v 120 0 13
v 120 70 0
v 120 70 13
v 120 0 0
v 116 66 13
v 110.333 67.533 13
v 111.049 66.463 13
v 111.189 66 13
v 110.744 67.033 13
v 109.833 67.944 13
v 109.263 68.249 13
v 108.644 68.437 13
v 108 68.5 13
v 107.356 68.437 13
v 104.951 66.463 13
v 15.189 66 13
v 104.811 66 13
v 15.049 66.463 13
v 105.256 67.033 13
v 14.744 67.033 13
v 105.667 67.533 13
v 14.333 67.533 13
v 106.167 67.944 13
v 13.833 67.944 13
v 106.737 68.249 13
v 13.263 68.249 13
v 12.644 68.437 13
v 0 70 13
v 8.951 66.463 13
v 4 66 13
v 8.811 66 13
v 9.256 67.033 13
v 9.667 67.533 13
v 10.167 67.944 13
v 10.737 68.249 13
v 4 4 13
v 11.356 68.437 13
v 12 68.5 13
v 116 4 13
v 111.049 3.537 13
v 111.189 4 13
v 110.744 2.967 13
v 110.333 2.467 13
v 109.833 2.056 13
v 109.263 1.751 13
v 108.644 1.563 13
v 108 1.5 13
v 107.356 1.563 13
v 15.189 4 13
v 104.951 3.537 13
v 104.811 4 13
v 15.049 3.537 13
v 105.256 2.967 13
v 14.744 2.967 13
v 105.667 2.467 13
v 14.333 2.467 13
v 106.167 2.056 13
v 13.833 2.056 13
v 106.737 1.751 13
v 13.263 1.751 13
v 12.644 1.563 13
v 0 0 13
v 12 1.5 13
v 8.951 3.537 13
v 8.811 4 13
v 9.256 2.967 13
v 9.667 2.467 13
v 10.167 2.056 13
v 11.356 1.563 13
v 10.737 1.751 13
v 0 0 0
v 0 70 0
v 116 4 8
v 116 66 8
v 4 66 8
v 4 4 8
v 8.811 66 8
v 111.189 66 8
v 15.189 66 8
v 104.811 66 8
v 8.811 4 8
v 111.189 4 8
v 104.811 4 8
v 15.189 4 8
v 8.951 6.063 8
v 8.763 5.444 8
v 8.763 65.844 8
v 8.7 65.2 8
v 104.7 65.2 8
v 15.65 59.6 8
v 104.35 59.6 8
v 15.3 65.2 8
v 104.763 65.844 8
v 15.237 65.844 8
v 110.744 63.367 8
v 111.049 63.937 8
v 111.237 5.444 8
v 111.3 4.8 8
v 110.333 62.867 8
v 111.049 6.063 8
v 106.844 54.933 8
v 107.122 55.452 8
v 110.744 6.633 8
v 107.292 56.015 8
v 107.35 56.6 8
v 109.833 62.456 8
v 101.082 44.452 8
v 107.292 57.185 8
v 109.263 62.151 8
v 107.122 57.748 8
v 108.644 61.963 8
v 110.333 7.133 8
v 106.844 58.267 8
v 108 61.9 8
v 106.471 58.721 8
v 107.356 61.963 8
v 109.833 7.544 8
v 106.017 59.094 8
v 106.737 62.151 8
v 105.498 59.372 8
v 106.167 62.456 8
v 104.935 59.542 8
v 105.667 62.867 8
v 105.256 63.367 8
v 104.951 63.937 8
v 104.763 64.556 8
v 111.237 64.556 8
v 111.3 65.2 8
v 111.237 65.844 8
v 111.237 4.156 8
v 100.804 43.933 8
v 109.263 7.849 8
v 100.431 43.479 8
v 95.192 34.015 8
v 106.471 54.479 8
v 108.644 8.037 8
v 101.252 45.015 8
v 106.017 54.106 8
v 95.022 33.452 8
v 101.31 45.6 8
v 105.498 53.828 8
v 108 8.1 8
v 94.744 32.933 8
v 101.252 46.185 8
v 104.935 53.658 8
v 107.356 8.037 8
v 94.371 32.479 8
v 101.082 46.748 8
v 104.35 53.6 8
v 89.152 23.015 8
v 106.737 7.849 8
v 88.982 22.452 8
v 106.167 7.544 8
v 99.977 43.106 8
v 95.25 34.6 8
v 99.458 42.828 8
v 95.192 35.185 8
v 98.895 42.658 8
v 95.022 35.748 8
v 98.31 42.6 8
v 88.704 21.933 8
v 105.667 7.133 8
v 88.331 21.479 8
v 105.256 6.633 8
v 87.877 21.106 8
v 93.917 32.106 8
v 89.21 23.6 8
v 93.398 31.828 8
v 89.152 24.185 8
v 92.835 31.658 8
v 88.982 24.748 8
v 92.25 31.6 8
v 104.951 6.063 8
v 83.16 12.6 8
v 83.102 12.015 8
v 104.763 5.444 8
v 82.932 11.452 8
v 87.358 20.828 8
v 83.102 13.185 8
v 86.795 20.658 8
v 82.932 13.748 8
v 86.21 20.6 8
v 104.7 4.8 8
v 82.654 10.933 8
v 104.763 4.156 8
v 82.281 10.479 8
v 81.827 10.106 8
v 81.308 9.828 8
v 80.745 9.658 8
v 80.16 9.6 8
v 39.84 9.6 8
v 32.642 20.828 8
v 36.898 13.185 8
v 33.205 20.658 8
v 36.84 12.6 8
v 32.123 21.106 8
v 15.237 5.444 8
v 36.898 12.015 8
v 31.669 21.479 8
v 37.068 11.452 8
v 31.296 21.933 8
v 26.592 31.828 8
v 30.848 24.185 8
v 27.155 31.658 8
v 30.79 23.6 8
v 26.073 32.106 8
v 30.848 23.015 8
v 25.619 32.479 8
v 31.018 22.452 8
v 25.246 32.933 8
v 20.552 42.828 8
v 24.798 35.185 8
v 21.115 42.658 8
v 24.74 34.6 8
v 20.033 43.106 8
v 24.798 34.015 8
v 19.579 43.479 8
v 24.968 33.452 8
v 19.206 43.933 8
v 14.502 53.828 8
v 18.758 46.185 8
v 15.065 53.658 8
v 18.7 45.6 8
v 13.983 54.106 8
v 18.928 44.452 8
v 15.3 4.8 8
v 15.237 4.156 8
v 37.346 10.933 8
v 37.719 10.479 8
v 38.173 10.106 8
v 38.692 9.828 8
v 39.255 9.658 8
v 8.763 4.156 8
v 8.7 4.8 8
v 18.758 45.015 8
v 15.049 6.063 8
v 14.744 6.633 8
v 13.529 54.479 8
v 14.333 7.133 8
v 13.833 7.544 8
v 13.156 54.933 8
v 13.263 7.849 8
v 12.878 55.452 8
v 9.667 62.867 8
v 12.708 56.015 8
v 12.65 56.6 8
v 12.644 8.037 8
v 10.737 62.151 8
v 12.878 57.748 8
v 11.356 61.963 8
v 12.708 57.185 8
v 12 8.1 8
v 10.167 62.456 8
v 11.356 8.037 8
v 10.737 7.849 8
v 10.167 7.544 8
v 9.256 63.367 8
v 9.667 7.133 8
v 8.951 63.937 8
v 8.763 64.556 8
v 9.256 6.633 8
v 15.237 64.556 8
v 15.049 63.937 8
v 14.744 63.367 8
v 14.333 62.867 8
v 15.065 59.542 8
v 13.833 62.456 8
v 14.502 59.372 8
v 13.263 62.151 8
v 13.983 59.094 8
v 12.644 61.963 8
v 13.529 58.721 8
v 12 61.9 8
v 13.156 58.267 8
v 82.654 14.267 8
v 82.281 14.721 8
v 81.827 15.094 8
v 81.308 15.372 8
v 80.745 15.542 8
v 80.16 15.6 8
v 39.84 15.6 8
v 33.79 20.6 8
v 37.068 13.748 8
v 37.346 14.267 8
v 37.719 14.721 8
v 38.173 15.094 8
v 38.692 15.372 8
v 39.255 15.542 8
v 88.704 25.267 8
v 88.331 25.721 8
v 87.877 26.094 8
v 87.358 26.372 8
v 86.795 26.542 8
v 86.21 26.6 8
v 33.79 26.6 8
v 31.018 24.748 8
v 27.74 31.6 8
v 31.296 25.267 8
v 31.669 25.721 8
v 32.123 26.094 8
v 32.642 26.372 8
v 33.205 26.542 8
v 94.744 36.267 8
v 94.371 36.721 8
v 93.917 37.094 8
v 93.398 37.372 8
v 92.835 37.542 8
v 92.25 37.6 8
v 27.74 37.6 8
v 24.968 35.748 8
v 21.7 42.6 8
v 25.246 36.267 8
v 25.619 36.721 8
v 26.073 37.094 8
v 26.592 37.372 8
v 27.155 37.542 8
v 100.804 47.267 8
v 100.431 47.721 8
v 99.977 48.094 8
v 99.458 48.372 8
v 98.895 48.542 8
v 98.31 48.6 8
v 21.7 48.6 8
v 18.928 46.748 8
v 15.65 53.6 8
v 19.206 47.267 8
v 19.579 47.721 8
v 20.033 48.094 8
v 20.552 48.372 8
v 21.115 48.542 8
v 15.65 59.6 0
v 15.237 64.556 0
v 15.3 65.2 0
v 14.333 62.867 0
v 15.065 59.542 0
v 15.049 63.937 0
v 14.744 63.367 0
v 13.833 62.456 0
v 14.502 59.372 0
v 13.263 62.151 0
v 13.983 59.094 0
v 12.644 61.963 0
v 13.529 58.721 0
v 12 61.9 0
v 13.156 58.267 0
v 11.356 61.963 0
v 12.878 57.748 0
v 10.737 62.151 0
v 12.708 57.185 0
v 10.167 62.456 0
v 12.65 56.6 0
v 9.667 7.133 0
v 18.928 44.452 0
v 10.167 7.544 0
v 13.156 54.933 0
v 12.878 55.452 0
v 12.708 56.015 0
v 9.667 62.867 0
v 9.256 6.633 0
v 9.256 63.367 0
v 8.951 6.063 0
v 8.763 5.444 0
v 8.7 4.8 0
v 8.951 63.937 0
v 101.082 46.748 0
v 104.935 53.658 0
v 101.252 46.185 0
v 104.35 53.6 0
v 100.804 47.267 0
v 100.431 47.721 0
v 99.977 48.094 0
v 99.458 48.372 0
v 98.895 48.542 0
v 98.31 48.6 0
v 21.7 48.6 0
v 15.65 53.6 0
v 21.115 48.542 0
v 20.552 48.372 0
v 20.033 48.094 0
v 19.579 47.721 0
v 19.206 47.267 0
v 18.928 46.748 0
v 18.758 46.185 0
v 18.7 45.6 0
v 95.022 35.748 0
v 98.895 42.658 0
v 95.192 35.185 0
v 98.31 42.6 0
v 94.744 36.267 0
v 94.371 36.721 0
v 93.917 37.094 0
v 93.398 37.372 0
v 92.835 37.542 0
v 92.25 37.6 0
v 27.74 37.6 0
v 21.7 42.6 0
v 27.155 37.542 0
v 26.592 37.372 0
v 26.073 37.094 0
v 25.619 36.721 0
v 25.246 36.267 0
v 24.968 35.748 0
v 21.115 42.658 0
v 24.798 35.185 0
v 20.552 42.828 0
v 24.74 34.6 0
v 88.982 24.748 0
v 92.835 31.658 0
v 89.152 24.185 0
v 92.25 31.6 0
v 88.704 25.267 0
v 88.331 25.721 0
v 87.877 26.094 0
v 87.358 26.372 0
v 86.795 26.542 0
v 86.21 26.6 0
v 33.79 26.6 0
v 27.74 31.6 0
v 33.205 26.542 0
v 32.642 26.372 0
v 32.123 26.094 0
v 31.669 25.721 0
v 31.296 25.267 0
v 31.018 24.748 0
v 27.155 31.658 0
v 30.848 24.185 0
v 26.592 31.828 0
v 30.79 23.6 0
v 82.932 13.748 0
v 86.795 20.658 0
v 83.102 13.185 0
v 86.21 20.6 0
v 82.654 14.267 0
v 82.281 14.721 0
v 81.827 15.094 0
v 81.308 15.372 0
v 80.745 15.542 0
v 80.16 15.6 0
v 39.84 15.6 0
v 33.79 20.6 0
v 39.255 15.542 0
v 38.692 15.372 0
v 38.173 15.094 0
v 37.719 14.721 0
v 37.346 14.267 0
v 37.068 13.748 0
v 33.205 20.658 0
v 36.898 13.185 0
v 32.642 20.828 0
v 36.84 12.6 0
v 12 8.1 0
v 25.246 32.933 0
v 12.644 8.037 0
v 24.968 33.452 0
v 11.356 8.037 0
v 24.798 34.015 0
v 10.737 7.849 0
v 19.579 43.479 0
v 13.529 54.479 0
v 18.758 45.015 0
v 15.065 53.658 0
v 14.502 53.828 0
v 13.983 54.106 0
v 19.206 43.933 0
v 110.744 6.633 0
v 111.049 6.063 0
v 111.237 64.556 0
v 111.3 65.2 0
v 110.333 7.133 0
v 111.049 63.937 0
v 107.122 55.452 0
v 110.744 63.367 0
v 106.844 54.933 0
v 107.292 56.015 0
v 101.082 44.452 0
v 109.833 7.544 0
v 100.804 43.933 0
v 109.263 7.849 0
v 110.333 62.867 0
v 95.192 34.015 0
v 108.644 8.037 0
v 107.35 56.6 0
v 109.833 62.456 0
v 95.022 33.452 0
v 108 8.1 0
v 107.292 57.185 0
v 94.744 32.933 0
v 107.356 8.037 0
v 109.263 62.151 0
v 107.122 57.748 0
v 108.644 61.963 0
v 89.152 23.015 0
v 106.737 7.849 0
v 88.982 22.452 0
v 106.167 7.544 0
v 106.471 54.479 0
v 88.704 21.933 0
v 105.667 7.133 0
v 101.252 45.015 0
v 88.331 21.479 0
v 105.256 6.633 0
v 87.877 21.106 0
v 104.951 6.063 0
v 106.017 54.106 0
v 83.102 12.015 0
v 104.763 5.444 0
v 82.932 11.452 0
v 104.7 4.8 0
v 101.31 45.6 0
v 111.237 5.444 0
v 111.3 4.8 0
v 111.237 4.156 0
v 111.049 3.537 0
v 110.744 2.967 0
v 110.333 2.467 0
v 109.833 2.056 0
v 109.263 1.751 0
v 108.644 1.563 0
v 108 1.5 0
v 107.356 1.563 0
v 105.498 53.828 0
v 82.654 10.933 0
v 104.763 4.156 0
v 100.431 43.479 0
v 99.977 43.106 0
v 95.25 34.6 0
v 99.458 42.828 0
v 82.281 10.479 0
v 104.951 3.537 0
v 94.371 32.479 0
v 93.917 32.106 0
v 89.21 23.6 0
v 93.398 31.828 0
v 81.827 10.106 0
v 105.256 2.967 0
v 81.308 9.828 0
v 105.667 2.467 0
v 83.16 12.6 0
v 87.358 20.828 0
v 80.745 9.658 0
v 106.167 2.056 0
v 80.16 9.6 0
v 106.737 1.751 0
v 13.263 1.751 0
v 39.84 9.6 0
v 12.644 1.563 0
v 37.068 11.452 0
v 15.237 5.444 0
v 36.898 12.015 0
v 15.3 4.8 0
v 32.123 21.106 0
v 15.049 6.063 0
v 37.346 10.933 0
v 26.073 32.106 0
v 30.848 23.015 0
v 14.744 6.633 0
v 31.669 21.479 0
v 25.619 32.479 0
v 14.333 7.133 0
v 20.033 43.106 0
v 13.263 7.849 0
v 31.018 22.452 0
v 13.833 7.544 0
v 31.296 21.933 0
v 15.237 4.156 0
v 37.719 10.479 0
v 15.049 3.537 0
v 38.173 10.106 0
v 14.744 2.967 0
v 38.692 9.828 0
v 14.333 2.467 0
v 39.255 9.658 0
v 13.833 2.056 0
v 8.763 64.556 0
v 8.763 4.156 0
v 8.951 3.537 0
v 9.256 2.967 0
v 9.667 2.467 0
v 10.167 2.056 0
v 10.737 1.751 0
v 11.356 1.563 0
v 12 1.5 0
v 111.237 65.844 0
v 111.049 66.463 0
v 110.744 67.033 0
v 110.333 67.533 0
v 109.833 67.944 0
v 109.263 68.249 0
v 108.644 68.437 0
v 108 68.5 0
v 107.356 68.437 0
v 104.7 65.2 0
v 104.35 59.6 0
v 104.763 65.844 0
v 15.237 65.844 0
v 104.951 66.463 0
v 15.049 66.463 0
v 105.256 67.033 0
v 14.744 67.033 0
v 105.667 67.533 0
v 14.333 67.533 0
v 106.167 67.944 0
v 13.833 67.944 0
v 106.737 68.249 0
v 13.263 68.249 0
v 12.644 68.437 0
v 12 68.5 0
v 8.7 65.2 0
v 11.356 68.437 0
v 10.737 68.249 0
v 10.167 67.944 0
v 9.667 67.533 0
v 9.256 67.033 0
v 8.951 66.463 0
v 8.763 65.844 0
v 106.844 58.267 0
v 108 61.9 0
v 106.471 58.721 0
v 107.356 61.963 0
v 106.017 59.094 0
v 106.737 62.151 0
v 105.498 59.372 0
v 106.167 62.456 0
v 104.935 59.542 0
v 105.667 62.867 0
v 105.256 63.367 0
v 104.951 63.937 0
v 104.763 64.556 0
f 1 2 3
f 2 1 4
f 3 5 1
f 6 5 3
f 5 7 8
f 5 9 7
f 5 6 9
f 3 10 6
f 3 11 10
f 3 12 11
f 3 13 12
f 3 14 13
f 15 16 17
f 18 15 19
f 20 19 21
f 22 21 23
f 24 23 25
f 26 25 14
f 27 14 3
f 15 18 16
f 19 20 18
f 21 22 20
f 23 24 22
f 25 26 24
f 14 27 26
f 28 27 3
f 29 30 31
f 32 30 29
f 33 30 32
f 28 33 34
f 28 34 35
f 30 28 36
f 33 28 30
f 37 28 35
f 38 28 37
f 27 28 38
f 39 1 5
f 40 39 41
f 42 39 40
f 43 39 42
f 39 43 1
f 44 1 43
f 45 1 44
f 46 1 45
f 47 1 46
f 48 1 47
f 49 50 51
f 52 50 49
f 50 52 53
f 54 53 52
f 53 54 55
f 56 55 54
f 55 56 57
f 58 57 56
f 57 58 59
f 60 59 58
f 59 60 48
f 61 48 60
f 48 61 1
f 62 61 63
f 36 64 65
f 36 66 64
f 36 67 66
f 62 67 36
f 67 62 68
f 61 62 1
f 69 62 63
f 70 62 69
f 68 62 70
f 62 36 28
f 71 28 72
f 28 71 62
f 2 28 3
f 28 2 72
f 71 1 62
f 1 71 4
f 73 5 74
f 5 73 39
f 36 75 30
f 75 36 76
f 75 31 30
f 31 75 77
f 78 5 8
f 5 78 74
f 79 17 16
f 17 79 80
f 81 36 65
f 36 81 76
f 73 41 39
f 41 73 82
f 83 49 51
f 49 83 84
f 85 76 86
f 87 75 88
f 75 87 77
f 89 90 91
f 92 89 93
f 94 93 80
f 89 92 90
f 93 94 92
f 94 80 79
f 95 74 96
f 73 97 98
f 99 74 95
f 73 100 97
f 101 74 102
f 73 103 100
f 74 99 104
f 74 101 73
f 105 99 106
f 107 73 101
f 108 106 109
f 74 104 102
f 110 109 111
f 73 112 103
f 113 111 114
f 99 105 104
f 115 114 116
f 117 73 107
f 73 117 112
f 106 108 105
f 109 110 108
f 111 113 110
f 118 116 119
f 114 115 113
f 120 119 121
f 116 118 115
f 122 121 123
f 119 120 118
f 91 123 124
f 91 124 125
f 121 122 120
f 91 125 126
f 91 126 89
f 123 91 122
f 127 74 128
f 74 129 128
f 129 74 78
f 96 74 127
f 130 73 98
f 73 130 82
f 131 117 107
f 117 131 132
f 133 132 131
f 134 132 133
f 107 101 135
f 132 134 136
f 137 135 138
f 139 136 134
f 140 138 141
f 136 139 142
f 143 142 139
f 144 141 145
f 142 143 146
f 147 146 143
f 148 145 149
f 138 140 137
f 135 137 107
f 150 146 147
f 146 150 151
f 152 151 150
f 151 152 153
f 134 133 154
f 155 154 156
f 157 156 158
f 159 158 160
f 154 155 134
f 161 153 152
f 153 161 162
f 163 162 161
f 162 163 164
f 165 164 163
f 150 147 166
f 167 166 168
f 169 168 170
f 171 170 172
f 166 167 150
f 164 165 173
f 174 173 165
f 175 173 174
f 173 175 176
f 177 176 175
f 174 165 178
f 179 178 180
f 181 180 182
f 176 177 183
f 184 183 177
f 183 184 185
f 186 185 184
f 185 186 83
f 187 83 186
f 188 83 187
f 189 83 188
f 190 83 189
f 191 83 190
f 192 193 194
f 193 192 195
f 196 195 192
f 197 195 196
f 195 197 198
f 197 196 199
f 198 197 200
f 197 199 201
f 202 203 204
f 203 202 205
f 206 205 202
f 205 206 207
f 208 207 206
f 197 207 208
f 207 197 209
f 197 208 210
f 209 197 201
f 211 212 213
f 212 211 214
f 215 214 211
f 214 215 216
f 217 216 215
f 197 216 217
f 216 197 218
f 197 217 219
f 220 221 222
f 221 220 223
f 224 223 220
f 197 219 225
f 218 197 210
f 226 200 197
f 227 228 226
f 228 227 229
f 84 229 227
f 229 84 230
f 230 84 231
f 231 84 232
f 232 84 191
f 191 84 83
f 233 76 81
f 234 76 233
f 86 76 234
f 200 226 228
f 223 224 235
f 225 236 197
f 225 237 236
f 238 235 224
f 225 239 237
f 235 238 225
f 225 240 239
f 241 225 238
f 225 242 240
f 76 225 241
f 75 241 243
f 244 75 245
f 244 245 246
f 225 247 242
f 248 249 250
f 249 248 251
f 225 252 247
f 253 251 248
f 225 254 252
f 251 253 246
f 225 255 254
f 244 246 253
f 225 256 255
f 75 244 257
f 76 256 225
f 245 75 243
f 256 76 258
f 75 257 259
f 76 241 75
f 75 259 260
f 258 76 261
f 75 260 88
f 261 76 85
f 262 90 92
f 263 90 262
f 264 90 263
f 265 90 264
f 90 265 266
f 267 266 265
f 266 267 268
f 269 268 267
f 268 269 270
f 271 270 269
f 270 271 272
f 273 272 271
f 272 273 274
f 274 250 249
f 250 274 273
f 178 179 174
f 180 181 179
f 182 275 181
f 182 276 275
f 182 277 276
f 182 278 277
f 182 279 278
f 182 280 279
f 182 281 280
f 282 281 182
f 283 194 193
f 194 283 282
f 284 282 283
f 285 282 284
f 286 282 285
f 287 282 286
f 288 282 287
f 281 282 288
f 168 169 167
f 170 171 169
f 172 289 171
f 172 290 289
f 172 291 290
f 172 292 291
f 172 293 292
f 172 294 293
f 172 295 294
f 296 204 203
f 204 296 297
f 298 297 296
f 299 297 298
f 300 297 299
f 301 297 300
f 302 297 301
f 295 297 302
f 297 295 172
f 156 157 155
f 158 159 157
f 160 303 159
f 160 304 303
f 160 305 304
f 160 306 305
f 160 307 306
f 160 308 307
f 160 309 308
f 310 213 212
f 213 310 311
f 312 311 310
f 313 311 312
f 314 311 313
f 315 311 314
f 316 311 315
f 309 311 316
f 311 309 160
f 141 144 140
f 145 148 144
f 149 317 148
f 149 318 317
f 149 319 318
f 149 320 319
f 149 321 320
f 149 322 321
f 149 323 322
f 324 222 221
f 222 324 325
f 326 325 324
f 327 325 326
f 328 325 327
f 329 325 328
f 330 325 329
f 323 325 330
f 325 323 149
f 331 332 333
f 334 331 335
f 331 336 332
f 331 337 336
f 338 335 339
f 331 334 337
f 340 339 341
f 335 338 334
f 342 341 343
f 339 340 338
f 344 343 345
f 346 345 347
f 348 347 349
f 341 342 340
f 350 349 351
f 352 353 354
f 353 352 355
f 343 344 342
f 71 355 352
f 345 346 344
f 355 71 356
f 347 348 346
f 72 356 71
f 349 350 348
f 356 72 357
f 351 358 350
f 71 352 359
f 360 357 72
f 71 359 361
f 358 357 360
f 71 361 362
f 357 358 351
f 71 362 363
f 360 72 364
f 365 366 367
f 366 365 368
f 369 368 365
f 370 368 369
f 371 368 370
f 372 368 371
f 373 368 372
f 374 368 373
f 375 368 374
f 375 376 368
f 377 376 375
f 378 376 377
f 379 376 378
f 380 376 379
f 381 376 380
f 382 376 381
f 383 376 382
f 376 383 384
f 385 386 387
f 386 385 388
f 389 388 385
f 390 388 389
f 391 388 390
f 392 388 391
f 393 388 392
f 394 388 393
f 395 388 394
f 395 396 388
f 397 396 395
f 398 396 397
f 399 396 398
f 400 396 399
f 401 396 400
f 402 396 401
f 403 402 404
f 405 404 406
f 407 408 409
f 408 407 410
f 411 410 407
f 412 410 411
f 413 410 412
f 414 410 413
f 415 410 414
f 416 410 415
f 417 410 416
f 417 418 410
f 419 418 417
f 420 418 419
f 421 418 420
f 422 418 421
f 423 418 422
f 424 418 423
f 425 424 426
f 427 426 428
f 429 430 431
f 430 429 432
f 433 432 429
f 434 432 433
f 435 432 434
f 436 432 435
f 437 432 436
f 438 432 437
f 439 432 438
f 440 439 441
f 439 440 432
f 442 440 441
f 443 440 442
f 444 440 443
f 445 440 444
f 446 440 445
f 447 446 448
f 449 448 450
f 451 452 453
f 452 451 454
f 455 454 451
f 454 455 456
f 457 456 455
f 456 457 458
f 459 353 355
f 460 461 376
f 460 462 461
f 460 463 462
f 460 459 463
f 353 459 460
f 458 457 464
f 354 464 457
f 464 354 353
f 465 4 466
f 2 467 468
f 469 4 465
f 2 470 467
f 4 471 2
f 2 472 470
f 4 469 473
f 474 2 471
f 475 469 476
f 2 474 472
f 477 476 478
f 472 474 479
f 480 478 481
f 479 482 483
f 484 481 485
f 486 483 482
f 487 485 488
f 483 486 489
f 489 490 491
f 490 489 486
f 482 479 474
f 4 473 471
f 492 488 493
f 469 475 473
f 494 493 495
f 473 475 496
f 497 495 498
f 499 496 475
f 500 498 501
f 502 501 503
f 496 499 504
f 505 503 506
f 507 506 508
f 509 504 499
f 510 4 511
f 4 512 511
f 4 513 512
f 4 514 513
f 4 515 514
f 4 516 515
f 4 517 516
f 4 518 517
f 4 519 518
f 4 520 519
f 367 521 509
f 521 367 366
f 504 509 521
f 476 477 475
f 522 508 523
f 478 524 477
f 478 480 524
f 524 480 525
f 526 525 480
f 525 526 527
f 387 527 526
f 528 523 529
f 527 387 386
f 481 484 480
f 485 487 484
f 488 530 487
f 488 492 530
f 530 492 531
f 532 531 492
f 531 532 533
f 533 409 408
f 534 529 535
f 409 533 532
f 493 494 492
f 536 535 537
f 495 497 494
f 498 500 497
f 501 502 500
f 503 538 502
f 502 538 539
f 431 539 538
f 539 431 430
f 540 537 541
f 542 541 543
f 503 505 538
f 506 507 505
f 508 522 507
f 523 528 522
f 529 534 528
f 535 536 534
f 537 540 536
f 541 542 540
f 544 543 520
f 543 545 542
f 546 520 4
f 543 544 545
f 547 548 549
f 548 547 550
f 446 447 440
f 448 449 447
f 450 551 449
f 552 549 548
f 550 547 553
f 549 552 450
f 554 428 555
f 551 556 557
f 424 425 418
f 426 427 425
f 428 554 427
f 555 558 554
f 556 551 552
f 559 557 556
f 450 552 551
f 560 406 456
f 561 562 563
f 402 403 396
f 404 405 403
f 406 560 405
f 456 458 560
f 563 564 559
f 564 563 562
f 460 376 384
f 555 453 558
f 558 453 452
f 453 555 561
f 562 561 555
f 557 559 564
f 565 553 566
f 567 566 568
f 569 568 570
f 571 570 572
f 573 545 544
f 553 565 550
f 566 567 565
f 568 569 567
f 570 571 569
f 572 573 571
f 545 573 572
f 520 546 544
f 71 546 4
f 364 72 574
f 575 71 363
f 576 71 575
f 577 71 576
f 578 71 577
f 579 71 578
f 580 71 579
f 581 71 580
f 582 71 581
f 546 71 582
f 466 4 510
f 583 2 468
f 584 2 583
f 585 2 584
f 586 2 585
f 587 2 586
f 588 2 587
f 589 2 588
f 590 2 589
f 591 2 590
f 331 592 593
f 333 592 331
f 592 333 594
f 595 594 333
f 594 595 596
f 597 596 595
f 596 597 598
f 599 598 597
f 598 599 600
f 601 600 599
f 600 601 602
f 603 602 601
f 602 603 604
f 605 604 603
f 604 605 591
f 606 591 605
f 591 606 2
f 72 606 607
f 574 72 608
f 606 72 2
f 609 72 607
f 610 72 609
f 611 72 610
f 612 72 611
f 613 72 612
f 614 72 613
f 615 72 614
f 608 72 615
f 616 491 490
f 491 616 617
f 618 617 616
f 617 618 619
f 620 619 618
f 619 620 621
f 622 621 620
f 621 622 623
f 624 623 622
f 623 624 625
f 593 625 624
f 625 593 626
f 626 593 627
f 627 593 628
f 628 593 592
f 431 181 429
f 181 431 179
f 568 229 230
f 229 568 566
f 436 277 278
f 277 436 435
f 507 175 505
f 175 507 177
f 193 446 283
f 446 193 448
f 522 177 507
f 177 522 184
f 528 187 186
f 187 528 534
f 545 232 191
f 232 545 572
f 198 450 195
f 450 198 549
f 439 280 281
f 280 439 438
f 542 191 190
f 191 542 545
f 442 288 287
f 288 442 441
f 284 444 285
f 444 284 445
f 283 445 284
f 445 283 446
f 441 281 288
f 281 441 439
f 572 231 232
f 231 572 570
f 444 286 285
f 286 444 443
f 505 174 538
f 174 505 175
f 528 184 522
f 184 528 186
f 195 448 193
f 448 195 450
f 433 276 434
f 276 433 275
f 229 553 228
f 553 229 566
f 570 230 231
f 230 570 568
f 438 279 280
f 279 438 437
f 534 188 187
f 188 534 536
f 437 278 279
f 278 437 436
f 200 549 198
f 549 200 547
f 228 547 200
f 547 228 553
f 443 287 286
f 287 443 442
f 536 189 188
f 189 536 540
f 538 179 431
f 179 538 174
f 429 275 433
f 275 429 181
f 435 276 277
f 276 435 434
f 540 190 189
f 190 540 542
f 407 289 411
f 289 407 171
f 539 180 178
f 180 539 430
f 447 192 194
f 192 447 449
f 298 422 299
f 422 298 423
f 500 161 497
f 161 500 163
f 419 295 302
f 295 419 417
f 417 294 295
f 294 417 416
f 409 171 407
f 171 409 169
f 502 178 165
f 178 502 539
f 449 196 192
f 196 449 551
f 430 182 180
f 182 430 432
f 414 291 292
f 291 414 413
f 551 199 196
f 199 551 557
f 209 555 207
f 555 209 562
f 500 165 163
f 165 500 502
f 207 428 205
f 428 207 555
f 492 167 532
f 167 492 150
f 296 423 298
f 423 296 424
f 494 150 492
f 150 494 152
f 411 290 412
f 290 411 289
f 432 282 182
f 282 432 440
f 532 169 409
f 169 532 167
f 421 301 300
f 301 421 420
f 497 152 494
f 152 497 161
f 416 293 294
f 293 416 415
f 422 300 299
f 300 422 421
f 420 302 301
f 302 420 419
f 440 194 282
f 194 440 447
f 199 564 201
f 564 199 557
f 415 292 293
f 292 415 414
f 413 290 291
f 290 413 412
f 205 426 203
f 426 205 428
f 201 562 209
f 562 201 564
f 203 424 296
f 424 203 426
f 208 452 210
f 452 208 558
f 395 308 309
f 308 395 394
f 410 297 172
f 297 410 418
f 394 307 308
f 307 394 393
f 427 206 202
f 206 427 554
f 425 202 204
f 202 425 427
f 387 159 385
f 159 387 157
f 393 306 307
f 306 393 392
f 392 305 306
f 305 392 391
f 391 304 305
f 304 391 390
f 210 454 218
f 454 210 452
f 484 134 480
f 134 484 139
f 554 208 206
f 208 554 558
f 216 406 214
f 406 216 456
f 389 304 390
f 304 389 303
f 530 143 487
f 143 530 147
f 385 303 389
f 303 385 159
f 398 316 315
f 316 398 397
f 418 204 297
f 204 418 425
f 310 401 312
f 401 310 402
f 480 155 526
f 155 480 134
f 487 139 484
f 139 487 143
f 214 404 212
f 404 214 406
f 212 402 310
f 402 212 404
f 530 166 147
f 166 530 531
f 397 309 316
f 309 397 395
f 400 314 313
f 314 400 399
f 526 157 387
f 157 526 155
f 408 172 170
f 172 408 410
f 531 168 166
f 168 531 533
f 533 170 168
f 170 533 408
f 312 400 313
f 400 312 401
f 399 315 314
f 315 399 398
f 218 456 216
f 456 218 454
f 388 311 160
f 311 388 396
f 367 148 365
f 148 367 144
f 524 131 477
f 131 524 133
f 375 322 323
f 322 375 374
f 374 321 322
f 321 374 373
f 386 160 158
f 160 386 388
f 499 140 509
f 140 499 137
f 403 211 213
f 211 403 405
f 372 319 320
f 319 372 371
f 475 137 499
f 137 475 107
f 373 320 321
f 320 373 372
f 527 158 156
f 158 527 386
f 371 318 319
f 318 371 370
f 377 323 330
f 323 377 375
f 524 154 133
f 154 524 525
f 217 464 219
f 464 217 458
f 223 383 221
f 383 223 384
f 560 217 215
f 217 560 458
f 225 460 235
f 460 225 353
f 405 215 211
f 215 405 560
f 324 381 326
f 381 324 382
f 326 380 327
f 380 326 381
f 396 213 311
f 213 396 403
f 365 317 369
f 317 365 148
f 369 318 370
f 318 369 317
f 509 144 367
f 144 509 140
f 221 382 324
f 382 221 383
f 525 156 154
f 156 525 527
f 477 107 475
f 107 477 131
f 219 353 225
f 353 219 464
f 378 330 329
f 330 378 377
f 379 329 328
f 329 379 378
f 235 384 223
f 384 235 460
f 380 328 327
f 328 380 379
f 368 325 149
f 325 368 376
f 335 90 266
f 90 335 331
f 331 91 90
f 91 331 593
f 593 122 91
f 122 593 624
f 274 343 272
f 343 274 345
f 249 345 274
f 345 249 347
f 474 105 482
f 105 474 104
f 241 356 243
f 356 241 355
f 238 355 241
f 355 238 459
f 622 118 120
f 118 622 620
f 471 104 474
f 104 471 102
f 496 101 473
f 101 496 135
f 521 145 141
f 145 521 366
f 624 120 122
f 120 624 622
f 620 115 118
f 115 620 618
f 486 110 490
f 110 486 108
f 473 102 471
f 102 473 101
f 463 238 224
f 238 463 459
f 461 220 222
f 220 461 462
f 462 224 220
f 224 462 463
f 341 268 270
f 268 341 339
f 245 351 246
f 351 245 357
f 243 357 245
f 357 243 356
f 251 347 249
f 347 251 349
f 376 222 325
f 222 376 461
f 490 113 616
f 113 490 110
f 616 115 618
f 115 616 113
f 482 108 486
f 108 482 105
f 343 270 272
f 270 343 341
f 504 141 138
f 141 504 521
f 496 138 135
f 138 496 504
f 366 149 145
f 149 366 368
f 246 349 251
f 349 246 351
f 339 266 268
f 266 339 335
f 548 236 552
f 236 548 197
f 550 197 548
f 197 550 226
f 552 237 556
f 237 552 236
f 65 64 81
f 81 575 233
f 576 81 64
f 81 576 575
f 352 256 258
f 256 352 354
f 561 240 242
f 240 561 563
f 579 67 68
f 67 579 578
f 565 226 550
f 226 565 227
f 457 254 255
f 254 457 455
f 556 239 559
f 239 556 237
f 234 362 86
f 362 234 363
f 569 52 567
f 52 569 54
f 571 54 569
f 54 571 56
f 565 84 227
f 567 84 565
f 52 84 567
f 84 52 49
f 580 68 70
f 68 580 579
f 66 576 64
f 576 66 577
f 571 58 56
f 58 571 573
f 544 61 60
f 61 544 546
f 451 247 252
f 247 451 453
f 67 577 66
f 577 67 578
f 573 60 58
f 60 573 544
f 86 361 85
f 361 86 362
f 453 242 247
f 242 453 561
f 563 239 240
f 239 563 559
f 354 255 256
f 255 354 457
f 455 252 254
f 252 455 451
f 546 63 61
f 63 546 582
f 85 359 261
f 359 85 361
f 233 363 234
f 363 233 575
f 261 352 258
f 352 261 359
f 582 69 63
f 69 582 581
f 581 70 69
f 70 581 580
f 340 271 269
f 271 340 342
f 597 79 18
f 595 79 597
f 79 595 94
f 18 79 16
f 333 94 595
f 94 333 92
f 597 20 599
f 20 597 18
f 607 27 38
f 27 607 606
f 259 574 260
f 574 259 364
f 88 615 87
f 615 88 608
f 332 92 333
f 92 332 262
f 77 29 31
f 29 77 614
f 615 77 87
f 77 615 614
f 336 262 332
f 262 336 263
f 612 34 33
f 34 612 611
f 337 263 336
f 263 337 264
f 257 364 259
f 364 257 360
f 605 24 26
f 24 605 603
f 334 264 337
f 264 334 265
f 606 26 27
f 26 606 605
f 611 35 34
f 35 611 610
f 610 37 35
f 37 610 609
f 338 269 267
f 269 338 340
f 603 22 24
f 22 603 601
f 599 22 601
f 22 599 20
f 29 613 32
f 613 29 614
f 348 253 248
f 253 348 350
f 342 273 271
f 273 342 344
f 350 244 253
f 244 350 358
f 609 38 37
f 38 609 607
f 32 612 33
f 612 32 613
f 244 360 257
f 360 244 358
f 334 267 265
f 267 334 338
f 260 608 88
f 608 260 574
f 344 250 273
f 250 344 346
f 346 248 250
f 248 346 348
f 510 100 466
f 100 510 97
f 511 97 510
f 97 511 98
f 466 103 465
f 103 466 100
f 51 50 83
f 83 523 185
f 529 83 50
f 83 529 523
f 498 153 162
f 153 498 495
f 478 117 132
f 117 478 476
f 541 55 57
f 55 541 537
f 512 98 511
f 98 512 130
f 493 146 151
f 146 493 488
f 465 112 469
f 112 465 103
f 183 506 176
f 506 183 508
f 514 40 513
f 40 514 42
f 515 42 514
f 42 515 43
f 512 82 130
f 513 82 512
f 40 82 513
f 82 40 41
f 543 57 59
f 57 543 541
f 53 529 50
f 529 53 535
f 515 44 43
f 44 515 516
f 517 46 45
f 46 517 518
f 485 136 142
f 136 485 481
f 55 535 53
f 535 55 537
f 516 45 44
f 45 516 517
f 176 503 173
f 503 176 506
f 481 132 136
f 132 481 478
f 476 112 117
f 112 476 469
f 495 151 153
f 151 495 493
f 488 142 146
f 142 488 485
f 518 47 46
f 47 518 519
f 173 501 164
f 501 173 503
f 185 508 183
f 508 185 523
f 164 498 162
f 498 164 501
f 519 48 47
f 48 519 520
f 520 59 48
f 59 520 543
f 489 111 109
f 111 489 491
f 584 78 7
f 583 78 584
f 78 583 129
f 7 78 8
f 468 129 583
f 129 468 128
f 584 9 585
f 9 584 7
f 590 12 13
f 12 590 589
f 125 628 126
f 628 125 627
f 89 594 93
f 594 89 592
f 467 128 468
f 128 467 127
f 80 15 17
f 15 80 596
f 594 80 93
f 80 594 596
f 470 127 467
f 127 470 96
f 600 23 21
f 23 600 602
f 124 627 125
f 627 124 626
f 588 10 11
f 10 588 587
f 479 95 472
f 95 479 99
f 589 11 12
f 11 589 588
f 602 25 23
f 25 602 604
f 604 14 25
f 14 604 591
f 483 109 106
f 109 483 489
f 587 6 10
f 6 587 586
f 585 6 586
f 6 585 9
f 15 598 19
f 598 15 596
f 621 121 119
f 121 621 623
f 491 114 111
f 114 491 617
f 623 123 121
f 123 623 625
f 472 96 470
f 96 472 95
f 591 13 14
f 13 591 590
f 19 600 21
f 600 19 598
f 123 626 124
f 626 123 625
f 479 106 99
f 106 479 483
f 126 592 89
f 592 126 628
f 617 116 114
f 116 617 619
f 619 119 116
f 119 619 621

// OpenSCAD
$fn = 32;

// ----------------------------------------------------------------------
// Slotted panel: 120 x 70 mm, 5 рядов of slots
// ----------------------------------------------------------------------

// --- parameters (mm) ---
panel_w = 120;            // panel width
panel_d = 70;             // panel depth
thick = 8;                // panel thickness
slot_w = 6;               // slot width
pitch0 = 11;              // first row pitch
pitch_step = 1.8;         // pitch increase per row
margin = 9.6;             // margin around the slot field
rows = 5;                 // number of slot rows
mount_d = 6.6;            // mounting holes
mount_x = 48;             // mounting hole offset
rim_h = 13;               // rim height
rim_t = 4;                // rim wall thickness

difference() {
  union() {
    cube([panel_w, panel_d, thick]);
    translate([0, 0, thick - 1]) difference() {
      cube([panel_w, panel_d, rim_h - thick + 1]);
      translate([rim_t, rim_t, -2.5]) cube([panel_w - 2 * rim_t, panel_d - 2 * rim_t, rim_h - thick + 6]);
    }
  }
  /* slot rows: stadium shaped cutters, 2.5 mm clear of both faces */
  /* row 0: pitch 11, length 40.32 */
  hull() {
    translate([39.84, 12.6, -2.5]) cylinder(h = thick + 5, d = slot_w);
    translate([80.16, 12.6, -2.5]) cylinder(h = thick + 5, d = slot_w);
  }
  /* row 1: pitch 11, length 52.42 */
  hull() {
    translate([33.79, 23.6, -2.5]) cylinder(h = thick + 5, d = slot_w);
    translate([86.21, 23.6, -2.5]) cylinder(h = thick + 5, d = slot_w);
  }
  /* row 2: pitch 11, length 64.51 */
  hull() {
    translate([27.74, 34.6, -2.5]) cylinder(h = thick + 5, d = slot_w);
    translate([92.25, 34.6, -2.5]) cylinder(h = thick + 5, d = slot_w);
  }
  /* row 3: pitch 11, length 76.61 */
  hull() {
    translate([21.7, 45.6, -2.5]) cylinder(h = thick + 5, d = slot_w);
    translate([98.31, 45.6, -2.5]) cylinder(h = thick + 5, d = slot_w);
  }
  /* row 4: pitch 11, length 88.7 */
  hull() {
    translate([15.65, 56.6, -2.5]) cylinder(h = thick + 5, d = slot_w);
    translate([104.35, 56.6, -2.5]) cylinder(h = thick + 5, d = slot_w);
  }
  translate([12, 4.8, -2.5]) cylinder(h = 18, d = mount_d);
  translate([12, 65.2, -2.5]) cylinder(h = 18, d = mount_d);
  translate([108, 4.8, -2.5]) cylinder(h = 18, d = mount_d);
  translate([108, 65.2, -2.5]) cylinder(h = 18, d = mount_d);
}
